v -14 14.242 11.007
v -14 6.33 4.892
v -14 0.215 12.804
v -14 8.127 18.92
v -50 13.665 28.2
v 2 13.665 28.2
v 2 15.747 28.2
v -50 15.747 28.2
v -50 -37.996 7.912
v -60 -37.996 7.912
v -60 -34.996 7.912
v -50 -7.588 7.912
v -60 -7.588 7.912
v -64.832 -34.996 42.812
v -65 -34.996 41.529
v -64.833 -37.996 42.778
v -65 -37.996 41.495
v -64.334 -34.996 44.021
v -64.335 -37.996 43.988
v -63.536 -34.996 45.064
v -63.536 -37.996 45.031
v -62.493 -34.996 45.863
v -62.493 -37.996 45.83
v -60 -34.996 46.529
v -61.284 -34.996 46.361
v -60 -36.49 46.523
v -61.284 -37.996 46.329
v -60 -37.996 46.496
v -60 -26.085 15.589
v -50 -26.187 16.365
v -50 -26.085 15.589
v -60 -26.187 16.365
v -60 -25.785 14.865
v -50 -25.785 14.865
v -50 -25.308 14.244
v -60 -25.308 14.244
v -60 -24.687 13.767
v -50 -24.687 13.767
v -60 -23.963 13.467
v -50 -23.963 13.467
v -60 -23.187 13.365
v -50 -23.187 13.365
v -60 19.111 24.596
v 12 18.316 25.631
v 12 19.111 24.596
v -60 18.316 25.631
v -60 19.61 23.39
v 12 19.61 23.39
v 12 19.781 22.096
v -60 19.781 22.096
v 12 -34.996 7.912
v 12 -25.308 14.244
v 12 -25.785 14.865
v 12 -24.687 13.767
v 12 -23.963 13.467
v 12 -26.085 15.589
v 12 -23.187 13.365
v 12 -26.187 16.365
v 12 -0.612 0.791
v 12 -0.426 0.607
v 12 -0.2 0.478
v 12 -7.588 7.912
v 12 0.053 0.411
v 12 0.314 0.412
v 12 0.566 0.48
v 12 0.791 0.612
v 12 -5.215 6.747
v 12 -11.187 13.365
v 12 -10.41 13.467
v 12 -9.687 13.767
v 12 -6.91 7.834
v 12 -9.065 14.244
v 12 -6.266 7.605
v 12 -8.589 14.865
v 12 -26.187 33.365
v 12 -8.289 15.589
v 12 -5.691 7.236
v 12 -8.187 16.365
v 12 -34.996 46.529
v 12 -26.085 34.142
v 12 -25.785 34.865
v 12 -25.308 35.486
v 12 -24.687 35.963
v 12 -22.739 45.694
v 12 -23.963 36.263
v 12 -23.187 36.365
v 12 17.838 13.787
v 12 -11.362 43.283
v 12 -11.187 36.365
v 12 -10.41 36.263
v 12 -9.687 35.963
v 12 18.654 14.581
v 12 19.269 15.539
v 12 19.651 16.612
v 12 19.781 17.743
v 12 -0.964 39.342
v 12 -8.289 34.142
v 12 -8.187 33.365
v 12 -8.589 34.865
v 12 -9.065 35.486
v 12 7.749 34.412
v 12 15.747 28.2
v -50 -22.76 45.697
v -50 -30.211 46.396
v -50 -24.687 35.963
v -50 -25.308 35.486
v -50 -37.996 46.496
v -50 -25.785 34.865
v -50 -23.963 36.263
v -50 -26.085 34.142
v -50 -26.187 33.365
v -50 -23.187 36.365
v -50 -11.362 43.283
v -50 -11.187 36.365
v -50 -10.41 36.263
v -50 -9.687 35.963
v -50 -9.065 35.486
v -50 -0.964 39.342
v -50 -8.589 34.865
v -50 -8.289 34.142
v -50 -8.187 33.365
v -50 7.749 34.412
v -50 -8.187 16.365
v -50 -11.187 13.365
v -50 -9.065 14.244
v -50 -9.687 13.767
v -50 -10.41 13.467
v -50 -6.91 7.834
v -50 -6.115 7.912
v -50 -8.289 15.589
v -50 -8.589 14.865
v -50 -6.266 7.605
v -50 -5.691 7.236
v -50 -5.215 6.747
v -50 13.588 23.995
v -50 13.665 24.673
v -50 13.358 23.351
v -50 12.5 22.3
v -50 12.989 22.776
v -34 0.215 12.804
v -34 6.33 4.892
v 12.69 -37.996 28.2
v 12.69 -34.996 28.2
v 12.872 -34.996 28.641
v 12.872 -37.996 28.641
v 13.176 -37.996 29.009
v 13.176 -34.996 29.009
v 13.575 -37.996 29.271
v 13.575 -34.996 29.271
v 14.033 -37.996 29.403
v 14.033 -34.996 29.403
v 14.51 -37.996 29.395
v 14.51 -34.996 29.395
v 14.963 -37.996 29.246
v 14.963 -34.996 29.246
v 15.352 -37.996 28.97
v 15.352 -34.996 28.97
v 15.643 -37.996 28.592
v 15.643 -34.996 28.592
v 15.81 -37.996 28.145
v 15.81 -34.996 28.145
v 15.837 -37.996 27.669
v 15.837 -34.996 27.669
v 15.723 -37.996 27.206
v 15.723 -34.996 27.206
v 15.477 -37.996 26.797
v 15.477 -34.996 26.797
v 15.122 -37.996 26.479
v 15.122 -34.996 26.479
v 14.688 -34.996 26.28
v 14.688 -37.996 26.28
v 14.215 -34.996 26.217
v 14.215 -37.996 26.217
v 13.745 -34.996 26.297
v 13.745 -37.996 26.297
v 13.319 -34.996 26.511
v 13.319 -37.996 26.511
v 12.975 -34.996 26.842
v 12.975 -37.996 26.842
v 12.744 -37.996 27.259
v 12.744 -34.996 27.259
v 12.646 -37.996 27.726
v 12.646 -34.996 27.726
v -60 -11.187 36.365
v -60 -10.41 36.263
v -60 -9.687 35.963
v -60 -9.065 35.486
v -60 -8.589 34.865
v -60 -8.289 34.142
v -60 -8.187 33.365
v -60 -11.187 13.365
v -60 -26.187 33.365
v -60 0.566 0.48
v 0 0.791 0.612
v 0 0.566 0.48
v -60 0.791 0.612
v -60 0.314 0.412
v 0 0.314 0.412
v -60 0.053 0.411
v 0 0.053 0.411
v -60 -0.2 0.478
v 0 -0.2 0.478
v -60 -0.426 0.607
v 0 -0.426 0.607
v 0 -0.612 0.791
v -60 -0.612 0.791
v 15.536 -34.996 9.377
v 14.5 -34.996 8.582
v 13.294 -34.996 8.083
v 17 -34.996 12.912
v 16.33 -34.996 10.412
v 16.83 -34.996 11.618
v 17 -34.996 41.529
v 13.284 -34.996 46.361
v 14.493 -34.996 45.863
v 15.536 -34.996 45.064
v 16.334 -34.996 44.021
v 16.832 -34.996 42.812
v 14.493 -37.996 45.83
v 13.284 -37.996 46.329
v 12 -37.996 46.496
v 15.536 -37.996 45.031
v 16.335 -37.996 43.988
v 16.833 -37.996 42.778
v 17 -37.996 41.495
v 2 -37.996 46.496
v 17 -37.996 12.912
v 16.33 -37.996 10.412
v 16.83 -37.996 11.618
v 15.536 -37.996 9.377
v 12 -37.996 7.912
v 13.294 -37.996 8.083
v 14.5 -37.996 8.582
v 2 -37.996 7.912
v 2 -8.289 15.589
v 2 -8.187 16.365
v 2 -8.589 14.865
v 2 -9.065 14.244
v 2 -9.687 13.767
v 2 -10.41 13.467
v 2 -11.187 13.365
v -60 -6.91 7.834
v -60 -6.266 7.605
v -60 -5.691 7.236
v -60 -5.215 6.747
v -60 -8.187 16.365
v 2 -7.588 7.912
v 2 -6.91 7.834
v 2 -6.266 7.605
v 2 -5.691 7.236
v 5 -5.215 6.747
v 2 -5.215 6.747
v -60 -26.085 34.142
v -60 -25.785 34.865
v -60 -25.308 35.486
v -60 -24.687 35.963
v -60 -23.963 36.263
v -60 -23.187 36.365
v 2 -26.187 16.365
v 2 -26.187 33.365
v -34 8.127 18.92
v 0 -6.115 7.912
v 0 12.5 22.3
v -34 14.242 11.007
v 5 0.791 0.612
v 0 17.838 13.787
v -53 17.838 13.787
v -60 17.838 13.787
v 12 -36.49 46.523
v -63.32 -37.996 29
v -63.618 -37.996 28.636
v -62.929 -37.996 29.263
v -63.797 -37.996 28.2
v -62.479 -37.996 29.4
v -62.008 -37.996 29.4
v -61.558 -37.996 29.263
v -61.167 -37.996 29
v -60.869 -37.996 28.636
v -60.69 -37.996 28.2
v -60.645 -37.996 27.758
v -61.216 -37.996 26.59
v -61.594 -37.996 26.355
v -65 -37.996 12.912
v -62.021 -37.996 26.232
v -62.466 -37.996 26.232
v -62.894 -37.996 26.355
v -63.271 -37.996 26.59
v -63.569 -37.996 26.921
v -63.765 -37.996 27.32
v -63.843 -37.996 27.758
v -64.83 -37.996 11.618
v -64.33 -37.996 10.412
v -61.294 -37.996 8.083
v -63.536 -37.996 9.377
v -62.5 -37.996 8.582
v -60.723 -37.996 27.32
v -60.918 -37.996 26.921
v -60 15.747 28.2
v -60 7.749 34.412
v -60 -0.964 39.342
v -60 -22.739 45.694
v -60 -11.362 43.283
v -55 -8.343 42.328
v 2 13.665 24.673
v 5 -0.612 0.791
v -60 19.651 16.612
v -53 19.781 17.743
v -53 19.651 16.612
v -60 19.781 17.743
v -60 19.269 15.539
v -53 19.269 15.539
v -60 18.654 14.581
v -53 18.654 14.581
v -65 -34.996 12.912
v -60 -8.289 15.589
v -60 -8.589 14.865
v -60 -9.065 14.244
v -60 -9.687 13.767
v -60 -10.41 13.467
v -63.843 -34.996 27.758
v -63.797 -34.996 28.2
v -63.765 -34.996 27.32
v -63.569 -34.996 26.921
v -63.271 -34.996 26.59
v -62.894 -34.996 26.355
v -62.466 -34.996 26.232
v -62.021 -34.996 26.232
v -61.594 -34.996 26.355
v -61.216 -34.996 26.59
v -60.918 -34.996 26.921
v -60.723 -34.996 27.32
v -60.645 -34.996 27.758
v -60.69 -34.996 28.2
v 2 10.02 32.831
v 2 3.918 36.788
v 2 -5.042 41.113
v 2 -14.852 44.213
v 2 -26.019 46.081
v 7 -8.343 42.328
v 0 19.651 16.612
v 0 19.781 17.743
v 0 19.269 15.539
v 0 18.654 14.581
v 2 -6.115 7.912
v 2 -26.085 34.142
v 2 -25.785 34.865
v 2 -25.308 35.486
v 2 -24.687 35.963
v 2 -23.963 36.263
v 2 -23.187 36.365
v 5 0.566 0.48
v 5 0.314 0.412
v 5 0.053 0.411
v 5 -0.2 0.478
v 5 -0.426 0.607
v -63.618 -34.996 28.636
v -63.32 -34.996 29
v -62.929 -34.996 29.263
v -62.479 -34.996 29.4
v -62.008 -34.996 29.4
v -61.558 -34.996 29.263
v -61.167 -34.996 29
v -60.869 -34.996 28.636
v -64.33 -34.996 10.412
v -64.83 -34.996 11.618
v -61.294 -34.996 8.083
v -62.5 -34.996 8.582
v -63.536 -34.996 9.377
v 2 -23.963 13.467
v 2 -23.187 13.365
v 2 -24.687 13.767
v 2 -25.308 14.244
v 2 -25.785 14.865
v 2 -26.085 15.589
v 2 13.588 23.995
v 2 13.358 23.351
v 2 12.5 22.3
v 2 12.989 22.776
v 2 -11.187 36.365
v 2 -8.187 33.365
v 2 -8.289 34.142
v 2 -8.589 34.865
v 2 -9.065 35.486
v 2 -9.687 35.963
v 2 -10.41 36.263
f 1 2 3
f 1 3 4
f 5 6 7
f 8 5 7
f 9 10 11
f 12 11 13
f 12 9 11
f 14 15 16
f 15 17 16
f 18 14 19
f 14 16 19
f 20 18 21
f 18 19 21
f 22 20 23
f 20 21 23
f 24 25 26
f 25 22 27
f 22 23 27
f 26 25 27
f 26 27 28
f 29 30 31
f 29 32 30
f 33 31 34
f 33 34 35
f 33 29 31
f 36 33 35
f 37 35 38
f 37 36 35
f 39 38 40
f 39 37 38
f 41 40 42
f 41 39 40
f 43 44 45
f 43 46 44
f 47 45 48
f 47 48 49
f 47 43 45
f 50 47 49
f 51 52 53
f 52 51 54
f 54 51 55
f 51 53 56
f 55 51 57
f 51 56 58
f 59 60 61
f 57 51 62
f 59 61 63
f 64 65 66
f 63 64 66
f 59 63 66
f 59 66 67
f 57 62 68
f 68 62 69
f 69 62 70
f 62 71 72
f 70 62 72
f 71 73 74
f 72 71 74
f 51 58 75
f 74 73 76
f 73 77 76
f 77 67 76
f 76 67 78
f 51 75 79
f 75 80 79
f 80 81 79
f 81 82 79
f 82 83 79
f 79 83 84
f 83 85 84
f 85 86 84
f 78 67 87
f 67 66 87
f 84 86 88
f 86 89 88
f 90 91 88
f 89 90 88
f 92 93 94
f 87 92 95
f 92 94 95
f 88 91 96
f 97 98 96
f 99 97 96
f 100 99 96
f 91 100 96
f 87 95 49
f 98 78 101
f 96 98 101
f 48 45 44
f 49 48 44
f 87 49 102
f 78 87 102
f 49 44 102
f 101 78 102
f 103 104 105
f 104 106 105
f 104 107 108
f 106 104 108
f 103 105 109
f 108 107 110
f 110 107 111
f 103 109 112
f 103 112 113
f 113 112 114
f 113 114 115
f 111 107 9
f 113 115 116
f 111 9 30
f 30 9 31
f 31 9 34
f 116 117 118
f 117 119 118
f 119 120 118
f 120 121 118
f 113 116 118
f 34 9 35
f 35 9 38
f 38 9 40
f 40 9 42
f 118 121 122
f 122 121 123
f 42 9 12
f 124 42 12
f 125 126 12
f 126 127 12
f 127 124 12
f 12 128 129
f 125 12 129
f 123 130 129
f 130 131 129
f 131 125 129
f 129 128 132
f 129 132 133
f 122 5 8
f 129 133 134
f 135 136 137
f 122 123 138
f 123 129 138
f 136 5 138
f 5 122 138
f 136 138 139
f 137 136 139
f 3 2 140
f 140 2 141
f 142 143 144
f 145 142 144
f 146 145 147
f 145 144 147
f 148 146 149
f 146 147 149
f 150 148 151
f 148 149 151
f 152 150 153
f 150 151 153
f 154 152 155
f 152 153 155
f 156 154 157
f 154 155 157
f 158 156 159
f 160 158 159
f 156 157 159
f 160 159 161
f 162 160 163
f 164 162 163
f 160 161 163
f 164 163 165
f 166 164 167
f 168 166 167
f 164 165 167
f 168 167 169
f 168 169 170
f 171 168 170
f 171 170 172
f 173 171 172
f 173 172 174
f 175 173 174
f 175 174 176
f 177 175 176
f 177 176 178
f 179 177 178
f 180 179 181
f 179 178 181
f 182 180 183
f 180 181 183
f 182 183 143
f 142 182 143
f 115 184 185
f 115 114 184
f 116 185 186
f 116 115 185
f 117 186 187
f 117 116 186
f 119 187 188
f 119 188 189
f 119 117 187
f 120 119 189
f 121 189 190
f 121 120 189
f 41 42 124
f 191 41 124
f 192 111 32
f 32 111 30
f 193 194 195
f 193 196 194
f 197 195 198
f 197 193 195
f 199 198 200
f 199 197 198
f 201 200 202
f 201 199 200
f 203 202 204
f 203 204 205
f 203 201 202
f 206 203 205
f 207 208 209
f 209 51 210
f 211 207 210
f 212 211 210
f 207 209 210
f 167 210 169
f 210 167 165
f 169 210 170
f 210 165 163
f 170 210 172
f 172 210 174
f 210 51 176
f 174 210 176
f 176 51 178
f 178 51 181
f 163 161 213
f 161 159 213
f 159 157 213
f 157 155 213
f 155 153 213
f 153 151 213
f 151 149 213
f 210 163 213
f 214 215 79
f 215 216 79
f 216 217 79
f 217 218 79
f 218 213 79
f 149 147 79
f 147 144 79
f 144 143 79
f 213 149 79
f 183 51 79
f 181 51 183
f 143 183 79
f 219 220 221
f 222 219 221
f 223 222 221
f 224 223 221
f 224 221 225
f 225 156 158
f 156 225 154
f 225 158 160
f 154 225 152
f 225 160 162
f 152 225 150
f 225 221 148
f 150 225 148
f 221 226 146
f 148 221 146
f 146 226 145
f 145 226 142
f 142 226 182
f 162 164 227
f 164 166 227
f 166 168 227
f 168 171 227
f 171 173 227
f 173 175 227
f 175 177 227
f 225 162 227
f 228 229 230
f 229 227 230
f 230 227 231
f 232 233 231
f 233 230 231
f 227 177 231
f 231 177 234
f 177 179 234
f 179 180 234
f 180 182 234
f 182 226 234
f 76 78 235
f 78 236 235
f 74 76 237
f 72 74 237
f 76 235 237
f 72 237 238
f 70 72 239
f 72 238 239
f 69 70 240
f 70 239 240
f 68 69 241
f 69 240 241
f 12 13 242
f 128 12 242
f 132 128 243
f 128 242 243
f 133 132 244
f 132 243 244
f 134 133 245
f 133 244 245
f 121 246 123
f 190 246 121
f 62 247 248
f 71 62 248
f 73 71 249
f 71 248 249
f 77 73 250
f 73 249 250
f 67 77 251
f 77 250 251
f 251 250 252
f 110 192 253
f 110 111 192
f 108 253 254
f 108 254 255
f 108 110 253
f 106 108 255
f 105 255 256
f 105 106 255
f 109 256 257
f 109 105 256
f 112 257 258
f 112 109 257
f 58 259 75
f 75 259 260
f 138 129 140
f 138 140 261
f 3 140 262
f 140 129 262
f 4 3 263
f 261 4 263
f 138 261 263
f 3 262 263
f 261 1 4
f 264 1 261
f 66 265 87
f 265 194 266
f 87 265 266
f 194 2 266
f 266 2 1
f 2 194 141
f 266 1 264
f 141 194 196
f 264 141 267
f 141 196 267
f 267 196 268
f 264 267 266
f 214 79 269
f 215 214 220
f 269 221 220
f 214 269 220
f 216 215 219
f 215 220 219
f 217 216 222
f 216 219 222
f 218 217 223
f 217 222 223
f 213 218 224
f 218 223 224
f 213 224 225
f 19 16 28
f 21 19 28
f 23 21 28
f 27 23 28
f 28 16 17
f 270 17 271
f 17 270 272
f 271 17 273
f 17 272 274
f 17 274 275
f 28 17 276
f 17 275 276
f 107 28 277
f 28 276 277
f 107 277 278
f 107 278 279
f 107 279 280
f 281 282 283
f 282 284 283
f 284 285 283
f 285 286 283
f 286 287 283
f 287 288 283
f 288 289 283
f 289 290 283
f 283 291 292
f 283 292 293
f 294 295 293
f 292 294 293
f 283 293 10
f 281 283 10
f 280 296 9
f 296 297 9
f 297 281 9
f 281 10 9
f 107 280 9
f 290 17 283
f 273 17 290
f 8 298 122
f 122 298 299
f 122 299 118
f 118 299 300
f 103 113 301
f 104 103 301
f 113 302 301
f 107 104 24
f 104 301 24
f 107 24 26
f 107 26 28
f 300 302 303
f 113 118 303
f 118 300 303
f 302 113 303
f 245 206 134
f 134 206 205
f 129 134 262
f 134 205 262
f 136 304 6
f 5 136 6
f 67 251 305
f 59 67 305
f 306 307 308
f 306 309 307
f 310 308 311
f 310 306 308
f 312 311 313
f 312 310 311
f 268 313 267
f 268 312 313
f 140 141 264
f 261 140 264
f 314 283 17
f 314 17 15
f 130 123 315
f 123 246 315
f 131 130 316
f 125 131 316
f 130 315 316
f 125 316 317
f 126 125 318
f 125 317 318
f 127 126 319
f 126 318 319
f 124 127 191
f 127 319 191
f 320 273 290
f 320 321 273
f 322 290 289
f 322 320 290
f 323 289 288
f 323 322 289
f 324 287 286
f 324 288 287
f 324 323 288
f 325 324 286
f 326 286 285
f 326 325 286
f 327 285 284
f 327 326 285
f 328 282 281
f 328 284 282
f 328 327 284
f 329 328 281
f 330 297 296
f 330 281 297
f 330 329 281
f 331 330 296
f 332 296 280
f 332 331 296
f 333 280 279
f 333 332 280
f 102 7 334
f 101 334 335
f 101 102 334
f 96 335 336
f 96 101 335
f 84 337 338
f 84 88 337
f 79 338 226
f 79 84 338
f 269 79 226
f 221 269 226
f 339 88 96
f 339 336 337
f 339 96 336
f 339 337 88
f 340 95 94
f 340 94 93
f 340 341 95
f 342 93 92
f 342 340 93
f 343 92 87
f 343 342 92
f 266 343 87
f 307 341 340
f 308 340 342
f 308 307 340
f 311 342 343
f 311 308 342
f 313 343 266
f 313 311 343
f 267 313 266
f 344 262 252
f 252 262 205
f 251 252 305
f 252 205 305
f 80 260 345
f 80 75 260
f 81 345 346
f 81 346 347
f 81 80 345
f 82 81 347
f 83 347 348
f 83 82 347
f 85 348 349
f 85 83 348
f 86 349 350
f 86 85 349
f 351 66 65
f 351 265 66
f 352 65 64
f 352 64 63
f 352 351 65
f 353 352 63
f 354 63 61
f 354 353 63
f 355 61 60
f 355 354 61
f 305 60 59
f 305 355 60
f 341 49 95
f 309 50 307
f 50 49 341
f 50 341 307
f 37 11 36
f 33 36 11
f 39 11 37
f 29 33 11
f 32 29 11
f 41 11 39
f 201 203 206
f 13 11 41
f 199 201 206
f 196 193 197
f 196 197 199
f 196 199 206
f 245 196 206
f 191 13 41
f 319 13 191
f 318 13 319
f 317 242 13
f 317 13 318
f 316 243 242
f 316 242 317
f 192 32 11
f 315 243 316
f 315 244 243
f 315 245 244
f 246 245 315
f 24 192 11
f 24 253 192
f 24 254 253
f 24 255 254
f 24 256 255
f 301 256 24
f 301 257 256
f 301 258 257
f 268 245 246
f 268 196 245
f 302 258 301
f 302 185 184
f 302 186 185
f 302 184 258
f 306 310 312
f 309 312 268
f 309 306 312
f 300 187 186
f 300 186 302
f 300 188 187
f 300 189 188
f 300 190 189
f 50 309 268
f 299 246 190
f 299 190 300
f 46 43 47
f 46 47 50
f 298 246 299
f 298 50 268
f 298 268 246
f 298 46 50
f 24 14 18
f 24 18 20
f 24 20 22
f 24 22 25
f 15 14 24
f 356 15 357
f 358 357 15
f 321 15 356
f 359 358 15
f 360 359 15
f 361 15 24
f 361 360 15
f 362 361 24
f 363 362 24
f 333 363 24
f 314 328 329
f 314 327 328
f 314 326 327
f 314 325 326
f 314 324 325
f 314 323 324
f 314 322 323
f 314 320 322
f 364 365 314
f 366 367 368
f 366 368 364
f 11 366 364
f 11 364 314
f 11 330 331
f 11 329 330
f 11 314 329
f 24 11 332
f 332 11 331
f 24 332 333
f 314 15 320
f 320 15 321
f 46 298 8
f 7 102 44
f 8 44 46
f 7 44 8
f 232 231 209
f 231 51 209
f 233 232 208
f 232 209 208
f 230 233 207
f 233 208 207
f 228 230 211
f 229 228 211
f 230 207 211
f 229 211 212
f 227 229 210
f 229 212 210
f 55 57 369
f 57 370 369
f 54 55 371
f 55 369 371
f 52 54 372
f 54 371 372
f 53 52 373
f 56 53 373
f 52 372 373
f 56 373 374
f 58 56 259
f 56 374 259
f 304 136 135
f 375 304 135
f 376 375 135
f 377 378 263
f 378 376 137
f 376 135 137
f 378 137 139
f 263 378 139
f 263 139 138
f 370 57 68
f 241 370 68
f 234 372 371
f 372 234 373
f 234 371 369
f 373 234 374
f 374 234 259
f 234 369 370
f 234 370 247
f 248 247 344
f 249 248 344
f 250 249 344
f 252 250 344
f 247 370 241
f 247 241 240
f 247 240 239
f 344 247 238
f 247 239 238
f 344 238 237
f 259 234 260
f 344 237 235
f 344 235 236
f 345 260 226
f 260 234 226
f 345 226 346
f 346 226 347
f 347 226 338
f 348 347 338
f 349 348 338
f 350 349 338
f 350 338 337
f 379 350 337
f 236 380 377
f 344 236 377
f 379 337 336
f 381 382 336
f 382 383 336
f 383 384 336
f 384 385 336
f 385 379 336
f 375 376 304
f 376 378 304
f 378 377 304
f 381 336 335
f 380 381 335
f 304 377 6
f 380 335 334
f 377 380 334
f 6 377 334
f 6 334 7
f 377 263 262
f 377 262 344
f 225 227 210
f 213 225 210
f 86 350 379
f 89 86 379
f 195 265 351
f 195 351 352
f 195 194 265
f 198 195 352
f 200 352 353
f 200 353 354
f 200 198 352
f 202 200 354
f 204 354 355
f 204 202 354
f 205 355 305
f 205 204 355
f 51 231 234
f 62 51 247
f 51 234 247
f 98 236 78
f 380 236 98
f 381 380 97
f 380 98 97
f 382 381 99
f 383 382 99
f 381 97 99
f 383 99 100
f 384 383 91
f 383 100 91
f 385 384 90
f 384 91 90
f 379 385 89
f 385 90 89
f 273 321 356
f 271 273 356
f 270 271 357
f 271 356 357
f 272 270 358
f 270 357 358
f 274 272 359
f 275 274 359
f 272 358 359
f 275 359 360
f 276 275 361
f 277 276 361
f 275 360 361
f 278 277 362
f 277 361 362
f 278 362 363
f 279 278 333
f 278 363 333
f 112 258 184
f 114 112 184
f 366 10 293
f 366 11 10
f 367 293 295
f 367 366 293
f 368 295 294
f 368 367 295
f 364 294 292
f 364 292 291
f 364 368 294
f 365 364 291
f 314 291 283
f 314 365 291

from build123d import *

# Parameters (mm, degrees)
EXTRUDE_1_DEPTH     = 5
SKETCH_2_W          = 5
SKETCH_2_H          = 25
EXTRUDE_2_DEPTH     = 10
EXTRUDE_3_DEPTH     = 43
EXTRUDE_4_DEPTH     = 10
CUT_EXTRUDE_1_DEPTH = 58
EXTRUDE_5_DEPTH     = 7
EXTRUDE_6_DEPTH     = 7
EXTRUDE_7_DEPTH     = 10
EXTRUDE_8_DEPTH     = 72
SKETCH_10_W         = 10
SKETCH_10_H         = 20.288176
EXTRUDE_9_DEPTH     = 5.9
FILLET_START        = -61
FILLET_1_DEPTH      = 74
FILLET_START_2      = -53.20464
FILLET_1_2_DEPTH    = 57.6
FILLET_START_3      = -60
FILLET_1_3_DEPTH    = 10
FILLET_START_4      = 2
FILLET_1_4_DEPTH    = 10
SKETCH_11_W         = 20.288176
SKETCH_11_H         = 3
EXTRUDE_10_DEPTH    = 5
SKETCH_12_R         = 1.6
CUT_EXTRUDE_2_DEPTH = 3
FILLET_3_R          = 1
SKETCH_13_W         = 15
SKETCH_13_H         = 3
EXTRUDE_11_DEPTH    = 2
CUT_EXTRUDE_3_REACH = 83.122
SKETCH_14_W         = 20
SKETCH_14_H         = 10
EXTRUDE_12_DEPTH    = 10
EXTRUDE_START       = 2
EXTRUDE_13_DEPTH    = 15
SKETCH_20_W         = 18
SKETCH_20_H         = 18
CUT_EXTRUDE_5_DEPTH = 98.660914
FILLET_7_R          = 5
CUT_EXTRUDE_6_DEPTH = 98.660914
FILLET_8_R          = 5
FILLET_9_R          = 5
SKETCH_22_W         = 5
SKETCH_22_H         = 18
CUT_EXTRUDE_7_DEPTH = 98.660914
FILLET_10_R         = 3
CUT_EXTRUDE_8_REACH = 98.904
SKETCH_23_R         = 1.6


with BuildPart() as part:
    # 草图1 → 凸台-拉伸1 (new body)
    with BuildSketch(Plane(origin=(0, 0, 0), x_dir=(0, 0, -1), z_dir=(1, 0, 0))):
        Polygon((0, 0), (11.868353, 9.172906), (-3.419823, 28.953494), (-15.288176, 19.780588), align=None)
    extrude(amount=EXTRUDE_1_DEPTH)

    # 草图2 → 凸台-拉伸2 (add)
    with BuildSketch(Plane(origin=(0, 0, 0), x_dir=(1, 0, 0), z_dir=(0, -0.6115270401858328, 0.7912235329674888))):
        with Locations((2.5, 12.5)):
            Rectangle(SKETCH_2_W, SKETCH_2_H)
    extrude(amount=EXTRUDE_2_DEPTH)

    # 草图3 → 凸台-拉伸3 (add)
    with BuildSketch(Plane.ZY):
        Polygon((23.200411, 13.665318), (15.288176, 19.780588), (0, 0), (7.912235, -6.11527), align=None)
    extrude(amount=EXTRUDE_3_DEPTH)

    # 草图4 → 凸台-拉伸4 (add)
    with BuildSketch(Plane.ZY.offset(43)):
        Polygon((15.288176, 19.780588), (3.419823, 28.953494), (-11.868353, 9.172906), (0, 0), (7.912235, -6.11527), (23.200411, 13.665318), align=None)
    extrude(amount=EXTRUDE_4_DEPTH)

    # 草图5 → 切除-拉伸1 (cut)
    with BuildSketch(Plane.ZY.offset(53)):
        Polygon((15.288176, 19.780588), (3.419823, 28.953494), (-11.868353, 9.172906), (0, 0), align=None)
    extrude(amount=-CUT_EXTRUDE_1_DEPTH, mode=Mode.SUBTRACT)

    # 草图6 → 凸台-拉伸5 (add)
    with BuildSketch(Plane.ZY.offset(53)):
        Polygon((15.288176, 19.780588), (0, 0), (7.912235, -6.11527), (23.200411, 13.665318), align=None)
    extrude(amount=EXTRUDE_5_DEPTH)

    # 草图7 → 凸台-拉伸6 (add)
    with BuildSketch(Plane(origin=(5, 0, 0), x_dir=(0, 0, -1), z_dir=(1, 0, 0))):
        Polygon((0, 0), (-15.288176, 19.780588), (-23.200411, 13.665318), (-7.912235, -6.11527), align=None)
    extrude(amount=EXTRUDE_6_DEPTH)

    # 草图8 → 凸台-拉伸7 (add)
    with BuildSketch(Plane(origin=(12, 0, 0), x_dir=(0, 0, -1), z_dir=(1, 0, 0))):
        Polygon((-23.200411, 13.665318), (-28.200411, 13.665318), (-28.200411, -24.848688), (-28.200411, -32.095582), (-7.912235, -32.095582), (-7.912235, -24.848688), (-7.912235, -6.11527), align=None)
    extrude_7 = extrude(amount=-EXTRUDE_7_DEPTH)

    # 镜向1: 凸台-拉伸7 across plane
    add(extrude_7.mirror(Plane.ZY.offset(24)))

    # 草图9 → 凸台-拉伸8 (add)
    with BuildSketch(Plane.ZY.offset(60)):
        Polygon((23.200411, 13.665318), (28.200411, 13.665318), (28.200411, 19.780588), (15.288176, 19.780588), align=None)
    extrude(amount=-EXTRUDE_8_DEPTH)

    # 草图10 → 凸台-拉伸9 (add)
    with BuildSketch(Plane.XZ.offset(32.095582)):
        with Locations((7, 18.056323)):
            Rectangle(SKETCH_10_W, SKETCH_10_H)
        with Locations((-55, 18.056323)):
            Rectangle(SKETCH_10_W, SKETCH_10_H)
    extrude(amount=EXTRUDE_9_DEPTH)

    # 圆角1: read off the stored shape, not the designer's step
    # 圆角1 outline → 圆角1 (cut)
    with BuildSketch(Plane.YZ.offset(FILLET_START)):
        with BuildLine():
            Line((19.780588, 28.200411), (16.780588, 28.200411))
            ThreePointArc((16.780588, 28.200411), (18.901909, 27.321732), (19.780588, 25.200411))
            Line((19.780588, 25.200411), (19.780588, 28.200411))
        make_face()
    extrude(amount=FILLET_1_DEPTH, mode=Mode.SUBTRACT)

    # Fillet 1 2 outline → Fillet 1 2 (add)
    with BuildSketch(Plane.YZ.offset(FILLET_START_2)):
        with BuildLine():
            ThreePointArc((13.665318, 24.673344), (13.358248, 23.351176), (12.499899, 22.299673))
            Line((12.499899, 22.299673), (13.665318, 23.200411))
            Line((13.665318, 23.200411), (13.665318, 24.673344))
        make_face()
    extrude(amount=FILLET_1_2_DEPTH)

    # Fillet 1 3 outline → Fillet 1 3 (add)
    with BuildSketch(Plane.YZ.offset(FILLET_START_3)):
        with BuildLine():
            ThreePointArc((-7.588203, 7.912235), (-6.266035, 7.605165), (-5.214532, 6.746816))
            Line((-5.214532, 6.746816), (-6.11527, 7.912235))
            Line((-6.11527, 7.912235), (-7.588203, 7.912235))
        make_face()
    extrude(amount=FILLET_1_3_DEPTH)

    # Fillet 1 4 outline → Fillet 1 4 (add)
    with BuildSketch(Plane.YZ.offset(FILLET_START_4)):
        with BuildLine():
            ThreePointArc((-7.588203, 7.912235), (-6.266035, 7.605165), (-5.214532, 6.746816))
            Line((-5.214532, 6.746816), (-6.11527, 7.912235))
            Line((-6.11527, 7.912235), (-7.588203, 7.912235))
        make_face()
    extrude(amount=FILLET_1_4_DEPTH)

    # 草图11 → 凸台-拉伸10 (add)
    with BuildSketch(Plane(origin=(12, 0, 0), x_dir=(0, 0, -1), z_dir=(1, 0, 0))):
        with Locations((-18.056323, -36.495582)):
            Rectangle(SKETCH_11_W, SKETCH_11_H)
    extrude_10 = extrude(amount=EXTRUDE_10_DEPTH)

    # 草图12 → 切除-拉伸2 (cut)
    with BuildSketch(Plane(origin=(0, -34.995582, 0), x_dir=(1, 0, 0), z_dir=(0, 1, 0))):
        with Locations((14.243648, -27.816949)):
            Circle(SKETCH_12_R)
    cut_extrude_2 = extrude(amount=-CUT_EXTRUDE_2_DEPTH, mode=Mode.SUBTRACT)

    # 镜向2: 凸台-拉伸10, 切除-拉伸2 across plane
    add(extrude_10.mirror(Plane.ZY.offset(24)))
    add(cut_extrude_2.mirror(Plane.ZY.offset(24)), mode=Mode.SUBTRACT)

    # 圆角3
    fillet_3_edges = [part.edges().sort_by_distance(p)[0] for p in [
        (-24, 0, 0),
    ]]
    fillet(fillet_3_edges, radius=FILLET_3_R)

    # 草图13 → 凸台-拉伸11 (add)
    with BuildSketch(Plane.XY.offset(28.200411)):
        with Locations((-57.5, -36.495582)):
            Rectangle(SKETCH_13_W, SKETCH_13_H)
        with Locations((9.5, -36.495582)):
            Rectangle(SKETCH_13_W, SKETCH_13_H)
    extrude(amount=EXTRUDE_11_DEPTH)

    # 草图14 → 切除-拉伸3 (cut, up to next)
    with BuildSketch(Plane(origin=(0, 0, 0), x_dir=(-1, 0, 0), z_dir=(0, 0.6115270401858329, -0.7912235329674886)), mode=Mode.PRIVATE) as cut_extrude_3_sk1:
        with Locations((24, 13)):
            Rectangle(SKETCH_14_W, SKETCH_14_H)
    cut_extrude_3_tool1 = extrude(cut_extrude_3_sk1.sketch, amount=-CUT_EXTRUDE_3_REACH, mode=Mode.PRIVATE) & part.part
    add(cut_extrude_3_tool1.solids().sort_by_distance((-24, 10.285906, 7.949852))[0], mode=Mode.SUBTRACT)

    # 草图18 → 凸台-拉伸12 (add)
    with BuildSketch(Plane(origin=(12, 0, 0), x_dir=(0, 0, -1), z_dir=(1, 0, 0))):
        with BuildLine():
            Line((-24.411336, 19.674955), (-24.411336, -37.995582))
            Line((-24.411336, -37.995582), (-46.496356, -37.995582))
            add(Edge.make_bspline(
                [(-24.411336, 19.674955), (-47.385024, -2.496577), (-46.496356, -37.995582)],
                knots=[0, 0, 0, 1, 1, 1], degree=2))
        make_face()
    extrude_12 = extrude(amount=-EXTRUDE_12_DEPTH)

    # 凸台-拉伸13: read off the stored shape, not the designer's step
    # 凸台-拉伸13 outline → 凸台-拉伸13 (add)
    with BuildSketch(Plane.YZ.offset(EXTRUDE_START)):
        with BuildLine():
            Line((-34.995582, 30.200411), (-34.995582, 46.528767))
            add(Edge.make_bspline(
                [(-34.995582, 46.528767), (-36.483492, 46.534209), (-37.995582, 46.496356)],
                knots=[0.957405, 0.957405, 0.957405, 1, 1, 1], degree=2))
            Line((-37.995582, 46.496356), (-37.995582, 30.200411))
            Line((-37.995582, 30.200411), (-34.995582, 30.200411))
        make_face()
    extrude_13 = extrude(amount=EXTRUDE_13_DEPTH)

    # 镜向3: 凸台-拉伸12, 凸台-拉伸13 across plane
    add(extrude_12.mirror(Plane.ZY.offset(24)))
    add(extrude_13.mirror(Plane.ZY.offset(24)))

    # 草图20 → 切除-拉伸5 (cut, through all)
    with BuildSketch(Plane(origin=(12, 0, 0), x_dir=(0, 0, -1), z_dir=(1, 0, 0))):
        with Locations((-22.365109, -17.186728)):
            Rectangle(SKETCH_20_W, SKETCH_20_H)
    extrude(amount=-CUT_EXTRUDE_5_DEPTH, mode=Mode.SUBTRACT)

    # 圆角7
    fillet_7_edges = [part.edges().sort_by_distance(p)[0] for p in [
        (17, -36.489537, 46.523386),
        (-65, -36.495582, 7.912235),
        (17, -36.495582, 7.912235),
        (-65, -36.489537, 46.523386),
    ]]
    fillet(fillet_7_edges, radius=FILLET_7_R - 0.0001)  # a hair under: the kernel refuses the full size

    # 草图21 → 切除-拉伸6 (cut, through all)
    with BuildSketch(Plane(origin=(12, 0, 0), x_dir=(0, 0, -1), z_dir=(1, 0, 0))):
        with BuildLine():
            Line((-28.200411, 15.747176), (-24.166999, 19.780588))
            Line((-24.166999, 19.780588), (-25.200411, 19.780588))
            ThreePointArc((-25.200411, 19.780588), (-27.321732, 18.901909), (-28.200411, 16.780588))
            Line((-28.200411, 16.780588), (-28.200411, 15.747176))
        make_face()
    extrude(amount=-CUT_EXTRUDE_6_DEPTH, mode=Mode.SUBTRACT)

    # 圆角8
    fillet_8_edges = [part.edges().sort_by_distance(p)[0] for p in [
        (-24, 19.780588, 24.166999),
    ]]
    fillet(fillet_8_edges, radius=FILLET_8_R)

    # 圆角9
    fillet_9_edges = [part.edges().sort_by_distance(p)[0] for p in [
        (-24, 19.780588, 15.288176),
    ]]
    fillet(fillet_9_edges, radius=FILLET_9_R)

    # 草图22 → 切除-拉伸7 (cut, through all)
    with BuildSketch(Plane.ZY.offset(60)):
        with Locations((33.865109, -17.186728)):
            Rectangle(SKETCH_22_W, SKETCH_22_H)
    extrude(amount=-CUT_EXTRUDE_7_DEPTH, mode=Mode.SUBTRACT)

    # 圆角10
    fillet_10_edges = [part.edges().sort_by_distance(p)[0] for p in [
        (7, -8.186728, 13.365109),
        (-55, -8.186728, 13.365109),
        (7, -26.186728, 13.365109),
        (-55, -26.186728, 13.365109),
        (7, -8.186728, 36.365109),
        (-55, -8.186728, 36.365109),
        (7, -26.186728, 36.365109),
        (-55, -26.186728, 36.365109),
    ]]
    fillet(fillet_10_edges, radius=FILLET_10_R)

    # 草图23 → 切除-拉伸8 (cut, up to next)
    with BuildSketch(Plane(origin=(0, -34.995582, 0), x_dir=(1, 0, 0), z_dir=(0, 1, 0)), mode=Mode.PRIVATE) as cut_extrude_8_sk1:
        with Locations(Location((14.243648, -27.816949, 0), (0, 0, 270))):
            Circle(SKETCH_23_R)
    cut_extrude_8_tool1 = extrude(cut_extrude_8_sk1.sketch, amount=-CUT_EXTRUDE_8_REACH, mode=Mode.PRIVATE) & part.part
    # 草图23 → 切除-拉伸8 (cut, up to next)
    with BuildSketch(Plane(origin=(0, -34.995582, 0), x_dir=(1, 0, 0), z_dir=(0, 1, 0)), mode=Mode.PRIVATE) as cut_extrude_8_sk2:
        with Locations(Location((-62.243648, -27.816949, 0), (0, 0, 270))):
            Circle(SKETCH_23_R)
    cut_extrude_8_tool2 = extrude(cut_extrude_8_sk2.sketch, amount=-CUT_EXTRUDE_8_REACH, mode=Mode.PRIVATE) & part.part
    add(cut_extrude_8_tool1.solids().sort_by_distance((14.243648, -34.995582, 27.816949))[0], mode=Mode.SUBTRACT)
    add(cut_extrude_8_tool2.solids().sort_by_distance((-62.243648, -34.995582, 27.816949))[0], mode=Mode.SUBTRACT)


solid = part.part
